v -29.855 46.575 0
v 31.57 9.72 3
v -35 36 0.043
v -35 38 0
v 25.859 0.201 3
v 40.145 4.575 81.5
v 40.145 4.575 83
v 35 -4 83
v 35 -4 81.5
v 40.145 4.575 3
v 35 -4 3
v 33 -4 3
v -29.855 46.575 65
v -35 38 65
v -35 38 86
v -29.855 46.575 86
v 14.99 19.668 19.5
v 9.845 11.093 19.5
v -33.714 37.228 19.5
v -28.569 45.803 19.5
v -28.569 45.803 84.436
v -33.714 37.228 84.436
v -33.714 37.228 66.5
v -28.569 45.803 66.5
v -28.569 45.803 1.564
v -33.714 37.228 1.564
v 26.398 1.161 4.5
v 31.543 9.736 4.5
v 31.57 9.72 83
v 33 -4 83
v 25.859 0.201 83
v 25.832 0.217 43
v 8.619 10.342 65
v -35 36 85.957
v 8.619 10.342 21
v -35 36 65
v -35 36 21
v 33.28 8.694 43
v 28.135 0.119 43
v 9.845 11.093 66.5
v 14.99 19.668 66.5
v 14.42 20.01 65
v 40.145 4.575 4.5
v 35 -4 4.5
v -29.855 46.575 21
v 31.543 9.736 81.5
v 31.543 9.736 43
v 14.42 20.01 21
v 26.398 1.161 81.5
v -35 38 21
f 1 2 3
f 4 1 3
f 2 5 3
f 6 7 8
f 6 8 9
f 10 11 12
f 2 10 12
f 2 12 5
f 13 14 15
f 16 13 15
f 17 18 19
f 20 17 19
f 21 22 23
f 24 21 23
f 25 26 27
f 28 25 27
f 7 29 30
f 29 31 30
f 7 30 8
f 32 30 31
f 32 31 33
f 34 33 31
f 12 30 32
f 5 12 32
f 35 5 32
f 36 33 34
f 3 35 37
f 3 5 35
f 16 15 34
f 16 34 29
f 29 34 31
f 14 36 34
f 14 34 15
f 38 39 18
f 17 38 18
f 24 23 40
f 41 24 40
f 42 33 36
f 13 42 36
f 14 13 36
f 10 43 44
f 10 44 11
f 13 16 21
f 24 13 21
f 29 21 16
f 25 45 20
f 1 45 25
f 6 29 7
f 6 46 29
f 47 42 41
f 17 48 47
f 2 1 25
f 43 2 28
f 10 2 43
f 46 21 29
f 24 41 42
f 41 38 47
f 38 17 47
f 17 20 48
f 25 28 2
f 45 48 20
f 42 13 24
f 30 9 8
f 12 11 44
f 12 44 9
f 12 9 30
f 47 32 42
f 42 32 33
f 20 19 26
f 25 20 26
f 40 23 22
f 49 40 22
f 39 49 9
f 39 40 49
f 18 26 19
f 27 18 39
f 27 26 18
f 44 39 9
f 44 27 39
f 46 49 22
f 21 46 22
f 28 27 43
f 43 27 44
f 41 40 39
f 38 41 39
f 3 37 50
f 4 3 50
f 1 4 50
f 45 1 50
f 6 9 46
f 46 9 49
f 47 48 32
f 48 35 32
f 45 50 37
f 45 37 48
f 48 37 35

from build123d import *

# Parameters (mm, degrees)
EXTRUDE_1_DEPTH     = 86
CUT_EXTRUDE_1_DEPTH = 3
EXTRUDE_2_DEPTH     = 10


with BuildPart() as part:
    # Эскиз1 → Бобышка-Вытянуть1 (new body)
    with BuildSketch(Plane.XY):
        Polygon((35, -4), (33, -4), (-35, 36), (-35, 38), align=None)
    extrude(amount=EXTRUDE_1_DEPTH)

    # Эскиз2 → Вырез-Вытянуть1 (cut)
    with BuildSketch(Plane(origin=(7.5, 12.5, 0), x_dir=(0.8574929257125444, -0.5144957554275262, 0), z_dir=(0.5144957554275262, 0.8574929257125444, 0))):
        Polygon((22.070235422, -3), (32.070235422, -3), (32.070235422, 0), (-49.563091106, 0), align=None)
        Polygon((-49.563091106, -21), (-49.563091106, -43), (22.038839221, -43), (2.070235422, -21), align=None)
        Polygon((-49.563091106, -43), (-49.563091106, -65), (2.070235422, -65), (22.038839221, -43), align=None)
        Polygon((22.070235422, -83), (-49.563091106, -86), (32.070235422, -86), (32.070235422, -83), align=None)
    extrude(amount=-CUT_EXTRUDE_1_DEPTH, mode=Mode.SUBTRACT)

    # Эскиз3 → Бобышка-Вытянуть2 (add)
    with BuildSketch(Plane(origin=(7.5, 12.5, 0), x_dir=(0.8574929257125444, -0.5144957554275262, 0), z_dir=(0.5144957554275262, 0.8574929257125444, 0))):
        Polygon((-49.563091106, -65), (-49.563091106, -86), (22.070235422, -83), (32.070235422, -83), (32.070235422, -81.5), (22.038839221, -81.5), (-48.063091106, -84.435865207), (-48.063091106, -66.5), (2.734491563, -66.5), (24.064591076, -43), (2.734491563, -19.5), (-48.063091106, -19.5), (-48.063091106, -1.564134793), (22.038839221, -4.5), (32.070235422, -4.5), (32.070235422, -3), (22.070235422, -3), (-49.563091106, 0), (-49.563091106, -21), (2.070235422, -21), (22.038839221, -43), (2.070235422, -65), align=None)
    extrude(amount=EXTRUDE_2_DEPTH)


solid = part.part
